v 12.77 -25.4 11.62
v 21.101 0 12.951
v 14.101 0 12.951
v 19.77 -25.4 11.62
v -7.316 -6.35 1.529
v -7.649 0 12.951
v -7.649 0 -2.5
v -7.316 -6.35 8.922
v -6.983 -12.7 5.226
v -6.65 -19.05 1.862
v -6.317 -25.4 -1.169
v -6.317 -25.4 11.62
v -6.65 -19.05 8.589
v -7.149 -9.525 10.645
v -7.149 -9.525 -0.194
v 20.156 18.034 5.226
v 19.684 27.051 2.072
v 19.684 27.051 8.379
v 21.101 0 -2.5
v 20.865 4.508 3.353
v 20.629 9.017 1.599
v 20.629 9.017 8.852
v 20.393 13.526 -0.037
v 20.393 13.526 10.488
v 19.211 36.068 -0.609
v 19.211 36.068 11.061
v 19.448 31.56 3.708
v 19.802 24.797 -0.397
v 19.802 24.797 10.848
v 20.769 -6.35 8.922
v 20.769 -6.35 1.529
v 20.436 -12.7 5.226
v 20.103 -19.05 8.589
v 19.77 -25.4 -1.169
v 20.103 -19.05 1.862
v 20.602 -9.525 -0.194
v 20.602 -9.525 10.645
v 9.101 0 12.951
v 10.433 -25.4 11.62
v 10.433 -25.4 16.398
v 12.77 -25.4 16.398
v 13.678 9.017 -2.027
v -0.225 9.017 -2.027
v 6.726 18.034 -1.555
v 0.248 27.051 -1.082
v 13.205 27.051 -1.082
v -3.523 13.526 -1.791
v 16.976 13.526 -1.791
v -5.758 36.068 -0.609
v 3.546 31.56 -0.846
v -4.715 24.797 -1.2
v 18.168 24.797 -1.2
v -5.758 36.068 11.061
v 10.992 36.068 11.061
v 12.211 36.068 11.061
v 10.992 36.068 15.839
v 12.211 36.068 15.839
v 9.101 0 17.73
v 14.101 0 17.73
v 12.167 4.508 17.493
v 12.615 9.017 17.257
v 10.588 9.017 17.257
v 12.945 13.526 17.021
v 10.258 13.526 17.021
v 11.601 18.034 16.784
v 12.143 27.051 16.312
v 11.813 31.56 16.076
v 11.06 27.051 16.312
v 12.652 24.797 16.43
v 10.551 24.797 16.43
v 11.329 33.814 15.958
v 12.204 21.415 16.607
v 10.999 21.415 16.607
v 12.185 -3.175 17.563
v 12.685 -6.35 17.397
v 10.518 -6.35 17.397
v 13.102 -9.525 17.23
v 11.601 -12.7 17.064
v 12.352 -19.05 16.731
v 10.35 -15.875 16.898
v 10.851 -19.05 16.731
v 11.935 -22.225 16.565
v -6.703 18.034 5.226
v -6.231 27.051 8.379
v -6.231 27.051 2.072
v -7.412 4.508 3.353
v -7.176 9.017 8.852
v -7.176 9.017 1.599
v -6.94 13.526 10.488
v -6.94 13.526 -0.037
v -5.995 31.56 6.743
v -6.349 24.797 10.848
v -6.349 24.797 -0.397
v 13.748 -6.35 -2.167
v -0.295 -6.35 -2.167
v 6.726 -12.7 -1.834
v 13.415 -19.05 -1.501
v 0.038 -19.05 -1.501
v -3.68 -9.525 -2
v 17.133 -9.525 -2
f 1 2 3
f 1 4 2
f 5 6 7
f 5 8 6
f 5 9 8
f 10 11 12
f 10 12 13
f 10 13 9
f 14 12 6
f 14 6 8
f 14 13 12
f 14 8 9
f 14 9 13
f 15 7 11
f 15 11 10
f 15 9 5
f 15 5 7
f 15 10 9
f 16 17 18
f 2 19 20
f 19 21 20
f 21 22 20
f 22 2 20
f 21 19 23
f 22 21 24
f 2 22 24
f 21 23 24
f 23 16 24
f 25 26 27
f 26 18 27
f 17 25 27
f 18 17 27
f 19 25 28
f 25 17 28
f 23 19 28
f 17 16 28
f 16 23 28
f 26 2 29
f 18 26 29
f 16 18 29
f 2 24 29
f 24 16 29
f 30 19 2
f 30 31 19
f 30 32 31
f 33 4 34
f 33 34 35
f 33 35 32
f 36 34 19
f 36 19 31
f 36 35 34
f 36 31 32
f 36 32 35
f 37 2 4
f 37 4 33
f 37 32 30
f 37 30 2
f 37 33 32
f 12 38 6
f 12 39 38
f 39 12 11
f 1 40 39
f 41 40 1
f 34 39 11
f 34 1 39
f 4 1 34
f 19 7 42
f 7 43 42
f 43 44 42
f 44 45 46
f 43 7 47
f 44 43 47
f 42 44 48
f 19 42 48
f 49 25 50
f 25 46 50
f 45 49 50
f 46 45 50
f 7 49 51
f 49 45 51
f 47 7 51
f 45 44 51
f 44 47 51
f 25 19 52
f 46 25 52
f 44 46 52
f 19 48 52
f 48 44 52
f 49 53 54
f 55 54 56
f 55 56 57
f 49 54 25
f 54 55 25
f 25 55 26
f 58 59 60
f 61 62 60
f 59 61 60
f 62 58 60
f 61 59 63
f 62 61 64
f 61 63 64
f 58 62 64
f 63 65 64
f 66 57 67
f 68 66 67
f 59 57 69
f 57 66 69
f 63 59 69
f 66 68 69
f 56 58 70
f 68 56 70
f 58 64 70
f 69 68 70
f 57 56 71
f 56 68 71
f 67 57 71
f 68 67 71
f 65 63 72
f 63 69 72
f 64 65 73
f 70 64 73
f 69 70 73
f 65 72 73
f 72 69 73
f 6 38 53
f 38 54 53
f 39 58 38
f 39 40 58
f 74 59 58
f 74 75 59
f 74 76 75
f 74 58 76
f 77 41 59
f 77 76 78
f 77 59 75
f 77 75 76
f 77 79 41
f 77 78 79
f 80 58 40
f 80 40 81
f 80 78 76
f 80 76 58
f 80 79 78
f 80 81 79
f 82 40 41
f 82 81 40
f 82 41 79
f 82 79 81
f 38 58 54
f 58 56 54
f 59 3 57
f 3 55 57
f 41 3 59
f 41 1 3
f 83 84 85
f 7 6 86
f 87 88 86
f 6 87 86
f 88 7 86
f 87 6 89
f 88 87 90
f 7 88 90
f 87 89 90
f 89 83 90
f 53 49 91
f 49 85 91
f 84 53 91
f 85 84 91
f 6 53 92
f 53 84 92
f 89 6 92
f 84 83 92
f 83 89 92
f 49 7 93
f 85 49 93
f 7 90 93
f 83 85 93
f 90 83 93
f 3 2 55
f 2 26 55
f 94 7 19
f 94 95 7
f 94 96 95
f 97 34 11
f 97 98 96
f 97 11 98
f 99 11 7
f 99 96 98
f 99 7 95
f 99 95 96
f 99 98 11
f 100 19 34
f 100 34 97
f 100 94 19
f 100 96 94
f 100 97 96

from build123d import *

# Parameters (mm, degrees)
F0_W          = 5
F0_H          = 4.7786854745
F1_DEPTH      = 36.068
F1_TAPER      = 3
F1_DEPTH_BACK = 25.4
F1_TAPER_BACK = 3


with BuildPart() as f1:
    # F0 (on Front) → F1 (new body, two sides)
    with BuildSketch(Plane.XZ) as f1_sk:
        Polygon((9.1014920583, 12.9509297859), (-7.6485093721, 12.9509297859), (-7.6485093721, -2.4996599448), (21.1014937648, -2.4996599448), (21.1014937648, 12.9509297859), (14.1014920583, 12.9509297859), align=None)
        with Locations((11.6014920583, 15.3402725232)):
            Rectangle(F0_W, F0_H)
    extrude(amount=-F1_DEPTH, taper=F1_TAPER)
    extrude(f1_sk.sketch, amount=F1_DEPTH_BACK, taper=F1_TAPER_BACK)


solid = f1.part
